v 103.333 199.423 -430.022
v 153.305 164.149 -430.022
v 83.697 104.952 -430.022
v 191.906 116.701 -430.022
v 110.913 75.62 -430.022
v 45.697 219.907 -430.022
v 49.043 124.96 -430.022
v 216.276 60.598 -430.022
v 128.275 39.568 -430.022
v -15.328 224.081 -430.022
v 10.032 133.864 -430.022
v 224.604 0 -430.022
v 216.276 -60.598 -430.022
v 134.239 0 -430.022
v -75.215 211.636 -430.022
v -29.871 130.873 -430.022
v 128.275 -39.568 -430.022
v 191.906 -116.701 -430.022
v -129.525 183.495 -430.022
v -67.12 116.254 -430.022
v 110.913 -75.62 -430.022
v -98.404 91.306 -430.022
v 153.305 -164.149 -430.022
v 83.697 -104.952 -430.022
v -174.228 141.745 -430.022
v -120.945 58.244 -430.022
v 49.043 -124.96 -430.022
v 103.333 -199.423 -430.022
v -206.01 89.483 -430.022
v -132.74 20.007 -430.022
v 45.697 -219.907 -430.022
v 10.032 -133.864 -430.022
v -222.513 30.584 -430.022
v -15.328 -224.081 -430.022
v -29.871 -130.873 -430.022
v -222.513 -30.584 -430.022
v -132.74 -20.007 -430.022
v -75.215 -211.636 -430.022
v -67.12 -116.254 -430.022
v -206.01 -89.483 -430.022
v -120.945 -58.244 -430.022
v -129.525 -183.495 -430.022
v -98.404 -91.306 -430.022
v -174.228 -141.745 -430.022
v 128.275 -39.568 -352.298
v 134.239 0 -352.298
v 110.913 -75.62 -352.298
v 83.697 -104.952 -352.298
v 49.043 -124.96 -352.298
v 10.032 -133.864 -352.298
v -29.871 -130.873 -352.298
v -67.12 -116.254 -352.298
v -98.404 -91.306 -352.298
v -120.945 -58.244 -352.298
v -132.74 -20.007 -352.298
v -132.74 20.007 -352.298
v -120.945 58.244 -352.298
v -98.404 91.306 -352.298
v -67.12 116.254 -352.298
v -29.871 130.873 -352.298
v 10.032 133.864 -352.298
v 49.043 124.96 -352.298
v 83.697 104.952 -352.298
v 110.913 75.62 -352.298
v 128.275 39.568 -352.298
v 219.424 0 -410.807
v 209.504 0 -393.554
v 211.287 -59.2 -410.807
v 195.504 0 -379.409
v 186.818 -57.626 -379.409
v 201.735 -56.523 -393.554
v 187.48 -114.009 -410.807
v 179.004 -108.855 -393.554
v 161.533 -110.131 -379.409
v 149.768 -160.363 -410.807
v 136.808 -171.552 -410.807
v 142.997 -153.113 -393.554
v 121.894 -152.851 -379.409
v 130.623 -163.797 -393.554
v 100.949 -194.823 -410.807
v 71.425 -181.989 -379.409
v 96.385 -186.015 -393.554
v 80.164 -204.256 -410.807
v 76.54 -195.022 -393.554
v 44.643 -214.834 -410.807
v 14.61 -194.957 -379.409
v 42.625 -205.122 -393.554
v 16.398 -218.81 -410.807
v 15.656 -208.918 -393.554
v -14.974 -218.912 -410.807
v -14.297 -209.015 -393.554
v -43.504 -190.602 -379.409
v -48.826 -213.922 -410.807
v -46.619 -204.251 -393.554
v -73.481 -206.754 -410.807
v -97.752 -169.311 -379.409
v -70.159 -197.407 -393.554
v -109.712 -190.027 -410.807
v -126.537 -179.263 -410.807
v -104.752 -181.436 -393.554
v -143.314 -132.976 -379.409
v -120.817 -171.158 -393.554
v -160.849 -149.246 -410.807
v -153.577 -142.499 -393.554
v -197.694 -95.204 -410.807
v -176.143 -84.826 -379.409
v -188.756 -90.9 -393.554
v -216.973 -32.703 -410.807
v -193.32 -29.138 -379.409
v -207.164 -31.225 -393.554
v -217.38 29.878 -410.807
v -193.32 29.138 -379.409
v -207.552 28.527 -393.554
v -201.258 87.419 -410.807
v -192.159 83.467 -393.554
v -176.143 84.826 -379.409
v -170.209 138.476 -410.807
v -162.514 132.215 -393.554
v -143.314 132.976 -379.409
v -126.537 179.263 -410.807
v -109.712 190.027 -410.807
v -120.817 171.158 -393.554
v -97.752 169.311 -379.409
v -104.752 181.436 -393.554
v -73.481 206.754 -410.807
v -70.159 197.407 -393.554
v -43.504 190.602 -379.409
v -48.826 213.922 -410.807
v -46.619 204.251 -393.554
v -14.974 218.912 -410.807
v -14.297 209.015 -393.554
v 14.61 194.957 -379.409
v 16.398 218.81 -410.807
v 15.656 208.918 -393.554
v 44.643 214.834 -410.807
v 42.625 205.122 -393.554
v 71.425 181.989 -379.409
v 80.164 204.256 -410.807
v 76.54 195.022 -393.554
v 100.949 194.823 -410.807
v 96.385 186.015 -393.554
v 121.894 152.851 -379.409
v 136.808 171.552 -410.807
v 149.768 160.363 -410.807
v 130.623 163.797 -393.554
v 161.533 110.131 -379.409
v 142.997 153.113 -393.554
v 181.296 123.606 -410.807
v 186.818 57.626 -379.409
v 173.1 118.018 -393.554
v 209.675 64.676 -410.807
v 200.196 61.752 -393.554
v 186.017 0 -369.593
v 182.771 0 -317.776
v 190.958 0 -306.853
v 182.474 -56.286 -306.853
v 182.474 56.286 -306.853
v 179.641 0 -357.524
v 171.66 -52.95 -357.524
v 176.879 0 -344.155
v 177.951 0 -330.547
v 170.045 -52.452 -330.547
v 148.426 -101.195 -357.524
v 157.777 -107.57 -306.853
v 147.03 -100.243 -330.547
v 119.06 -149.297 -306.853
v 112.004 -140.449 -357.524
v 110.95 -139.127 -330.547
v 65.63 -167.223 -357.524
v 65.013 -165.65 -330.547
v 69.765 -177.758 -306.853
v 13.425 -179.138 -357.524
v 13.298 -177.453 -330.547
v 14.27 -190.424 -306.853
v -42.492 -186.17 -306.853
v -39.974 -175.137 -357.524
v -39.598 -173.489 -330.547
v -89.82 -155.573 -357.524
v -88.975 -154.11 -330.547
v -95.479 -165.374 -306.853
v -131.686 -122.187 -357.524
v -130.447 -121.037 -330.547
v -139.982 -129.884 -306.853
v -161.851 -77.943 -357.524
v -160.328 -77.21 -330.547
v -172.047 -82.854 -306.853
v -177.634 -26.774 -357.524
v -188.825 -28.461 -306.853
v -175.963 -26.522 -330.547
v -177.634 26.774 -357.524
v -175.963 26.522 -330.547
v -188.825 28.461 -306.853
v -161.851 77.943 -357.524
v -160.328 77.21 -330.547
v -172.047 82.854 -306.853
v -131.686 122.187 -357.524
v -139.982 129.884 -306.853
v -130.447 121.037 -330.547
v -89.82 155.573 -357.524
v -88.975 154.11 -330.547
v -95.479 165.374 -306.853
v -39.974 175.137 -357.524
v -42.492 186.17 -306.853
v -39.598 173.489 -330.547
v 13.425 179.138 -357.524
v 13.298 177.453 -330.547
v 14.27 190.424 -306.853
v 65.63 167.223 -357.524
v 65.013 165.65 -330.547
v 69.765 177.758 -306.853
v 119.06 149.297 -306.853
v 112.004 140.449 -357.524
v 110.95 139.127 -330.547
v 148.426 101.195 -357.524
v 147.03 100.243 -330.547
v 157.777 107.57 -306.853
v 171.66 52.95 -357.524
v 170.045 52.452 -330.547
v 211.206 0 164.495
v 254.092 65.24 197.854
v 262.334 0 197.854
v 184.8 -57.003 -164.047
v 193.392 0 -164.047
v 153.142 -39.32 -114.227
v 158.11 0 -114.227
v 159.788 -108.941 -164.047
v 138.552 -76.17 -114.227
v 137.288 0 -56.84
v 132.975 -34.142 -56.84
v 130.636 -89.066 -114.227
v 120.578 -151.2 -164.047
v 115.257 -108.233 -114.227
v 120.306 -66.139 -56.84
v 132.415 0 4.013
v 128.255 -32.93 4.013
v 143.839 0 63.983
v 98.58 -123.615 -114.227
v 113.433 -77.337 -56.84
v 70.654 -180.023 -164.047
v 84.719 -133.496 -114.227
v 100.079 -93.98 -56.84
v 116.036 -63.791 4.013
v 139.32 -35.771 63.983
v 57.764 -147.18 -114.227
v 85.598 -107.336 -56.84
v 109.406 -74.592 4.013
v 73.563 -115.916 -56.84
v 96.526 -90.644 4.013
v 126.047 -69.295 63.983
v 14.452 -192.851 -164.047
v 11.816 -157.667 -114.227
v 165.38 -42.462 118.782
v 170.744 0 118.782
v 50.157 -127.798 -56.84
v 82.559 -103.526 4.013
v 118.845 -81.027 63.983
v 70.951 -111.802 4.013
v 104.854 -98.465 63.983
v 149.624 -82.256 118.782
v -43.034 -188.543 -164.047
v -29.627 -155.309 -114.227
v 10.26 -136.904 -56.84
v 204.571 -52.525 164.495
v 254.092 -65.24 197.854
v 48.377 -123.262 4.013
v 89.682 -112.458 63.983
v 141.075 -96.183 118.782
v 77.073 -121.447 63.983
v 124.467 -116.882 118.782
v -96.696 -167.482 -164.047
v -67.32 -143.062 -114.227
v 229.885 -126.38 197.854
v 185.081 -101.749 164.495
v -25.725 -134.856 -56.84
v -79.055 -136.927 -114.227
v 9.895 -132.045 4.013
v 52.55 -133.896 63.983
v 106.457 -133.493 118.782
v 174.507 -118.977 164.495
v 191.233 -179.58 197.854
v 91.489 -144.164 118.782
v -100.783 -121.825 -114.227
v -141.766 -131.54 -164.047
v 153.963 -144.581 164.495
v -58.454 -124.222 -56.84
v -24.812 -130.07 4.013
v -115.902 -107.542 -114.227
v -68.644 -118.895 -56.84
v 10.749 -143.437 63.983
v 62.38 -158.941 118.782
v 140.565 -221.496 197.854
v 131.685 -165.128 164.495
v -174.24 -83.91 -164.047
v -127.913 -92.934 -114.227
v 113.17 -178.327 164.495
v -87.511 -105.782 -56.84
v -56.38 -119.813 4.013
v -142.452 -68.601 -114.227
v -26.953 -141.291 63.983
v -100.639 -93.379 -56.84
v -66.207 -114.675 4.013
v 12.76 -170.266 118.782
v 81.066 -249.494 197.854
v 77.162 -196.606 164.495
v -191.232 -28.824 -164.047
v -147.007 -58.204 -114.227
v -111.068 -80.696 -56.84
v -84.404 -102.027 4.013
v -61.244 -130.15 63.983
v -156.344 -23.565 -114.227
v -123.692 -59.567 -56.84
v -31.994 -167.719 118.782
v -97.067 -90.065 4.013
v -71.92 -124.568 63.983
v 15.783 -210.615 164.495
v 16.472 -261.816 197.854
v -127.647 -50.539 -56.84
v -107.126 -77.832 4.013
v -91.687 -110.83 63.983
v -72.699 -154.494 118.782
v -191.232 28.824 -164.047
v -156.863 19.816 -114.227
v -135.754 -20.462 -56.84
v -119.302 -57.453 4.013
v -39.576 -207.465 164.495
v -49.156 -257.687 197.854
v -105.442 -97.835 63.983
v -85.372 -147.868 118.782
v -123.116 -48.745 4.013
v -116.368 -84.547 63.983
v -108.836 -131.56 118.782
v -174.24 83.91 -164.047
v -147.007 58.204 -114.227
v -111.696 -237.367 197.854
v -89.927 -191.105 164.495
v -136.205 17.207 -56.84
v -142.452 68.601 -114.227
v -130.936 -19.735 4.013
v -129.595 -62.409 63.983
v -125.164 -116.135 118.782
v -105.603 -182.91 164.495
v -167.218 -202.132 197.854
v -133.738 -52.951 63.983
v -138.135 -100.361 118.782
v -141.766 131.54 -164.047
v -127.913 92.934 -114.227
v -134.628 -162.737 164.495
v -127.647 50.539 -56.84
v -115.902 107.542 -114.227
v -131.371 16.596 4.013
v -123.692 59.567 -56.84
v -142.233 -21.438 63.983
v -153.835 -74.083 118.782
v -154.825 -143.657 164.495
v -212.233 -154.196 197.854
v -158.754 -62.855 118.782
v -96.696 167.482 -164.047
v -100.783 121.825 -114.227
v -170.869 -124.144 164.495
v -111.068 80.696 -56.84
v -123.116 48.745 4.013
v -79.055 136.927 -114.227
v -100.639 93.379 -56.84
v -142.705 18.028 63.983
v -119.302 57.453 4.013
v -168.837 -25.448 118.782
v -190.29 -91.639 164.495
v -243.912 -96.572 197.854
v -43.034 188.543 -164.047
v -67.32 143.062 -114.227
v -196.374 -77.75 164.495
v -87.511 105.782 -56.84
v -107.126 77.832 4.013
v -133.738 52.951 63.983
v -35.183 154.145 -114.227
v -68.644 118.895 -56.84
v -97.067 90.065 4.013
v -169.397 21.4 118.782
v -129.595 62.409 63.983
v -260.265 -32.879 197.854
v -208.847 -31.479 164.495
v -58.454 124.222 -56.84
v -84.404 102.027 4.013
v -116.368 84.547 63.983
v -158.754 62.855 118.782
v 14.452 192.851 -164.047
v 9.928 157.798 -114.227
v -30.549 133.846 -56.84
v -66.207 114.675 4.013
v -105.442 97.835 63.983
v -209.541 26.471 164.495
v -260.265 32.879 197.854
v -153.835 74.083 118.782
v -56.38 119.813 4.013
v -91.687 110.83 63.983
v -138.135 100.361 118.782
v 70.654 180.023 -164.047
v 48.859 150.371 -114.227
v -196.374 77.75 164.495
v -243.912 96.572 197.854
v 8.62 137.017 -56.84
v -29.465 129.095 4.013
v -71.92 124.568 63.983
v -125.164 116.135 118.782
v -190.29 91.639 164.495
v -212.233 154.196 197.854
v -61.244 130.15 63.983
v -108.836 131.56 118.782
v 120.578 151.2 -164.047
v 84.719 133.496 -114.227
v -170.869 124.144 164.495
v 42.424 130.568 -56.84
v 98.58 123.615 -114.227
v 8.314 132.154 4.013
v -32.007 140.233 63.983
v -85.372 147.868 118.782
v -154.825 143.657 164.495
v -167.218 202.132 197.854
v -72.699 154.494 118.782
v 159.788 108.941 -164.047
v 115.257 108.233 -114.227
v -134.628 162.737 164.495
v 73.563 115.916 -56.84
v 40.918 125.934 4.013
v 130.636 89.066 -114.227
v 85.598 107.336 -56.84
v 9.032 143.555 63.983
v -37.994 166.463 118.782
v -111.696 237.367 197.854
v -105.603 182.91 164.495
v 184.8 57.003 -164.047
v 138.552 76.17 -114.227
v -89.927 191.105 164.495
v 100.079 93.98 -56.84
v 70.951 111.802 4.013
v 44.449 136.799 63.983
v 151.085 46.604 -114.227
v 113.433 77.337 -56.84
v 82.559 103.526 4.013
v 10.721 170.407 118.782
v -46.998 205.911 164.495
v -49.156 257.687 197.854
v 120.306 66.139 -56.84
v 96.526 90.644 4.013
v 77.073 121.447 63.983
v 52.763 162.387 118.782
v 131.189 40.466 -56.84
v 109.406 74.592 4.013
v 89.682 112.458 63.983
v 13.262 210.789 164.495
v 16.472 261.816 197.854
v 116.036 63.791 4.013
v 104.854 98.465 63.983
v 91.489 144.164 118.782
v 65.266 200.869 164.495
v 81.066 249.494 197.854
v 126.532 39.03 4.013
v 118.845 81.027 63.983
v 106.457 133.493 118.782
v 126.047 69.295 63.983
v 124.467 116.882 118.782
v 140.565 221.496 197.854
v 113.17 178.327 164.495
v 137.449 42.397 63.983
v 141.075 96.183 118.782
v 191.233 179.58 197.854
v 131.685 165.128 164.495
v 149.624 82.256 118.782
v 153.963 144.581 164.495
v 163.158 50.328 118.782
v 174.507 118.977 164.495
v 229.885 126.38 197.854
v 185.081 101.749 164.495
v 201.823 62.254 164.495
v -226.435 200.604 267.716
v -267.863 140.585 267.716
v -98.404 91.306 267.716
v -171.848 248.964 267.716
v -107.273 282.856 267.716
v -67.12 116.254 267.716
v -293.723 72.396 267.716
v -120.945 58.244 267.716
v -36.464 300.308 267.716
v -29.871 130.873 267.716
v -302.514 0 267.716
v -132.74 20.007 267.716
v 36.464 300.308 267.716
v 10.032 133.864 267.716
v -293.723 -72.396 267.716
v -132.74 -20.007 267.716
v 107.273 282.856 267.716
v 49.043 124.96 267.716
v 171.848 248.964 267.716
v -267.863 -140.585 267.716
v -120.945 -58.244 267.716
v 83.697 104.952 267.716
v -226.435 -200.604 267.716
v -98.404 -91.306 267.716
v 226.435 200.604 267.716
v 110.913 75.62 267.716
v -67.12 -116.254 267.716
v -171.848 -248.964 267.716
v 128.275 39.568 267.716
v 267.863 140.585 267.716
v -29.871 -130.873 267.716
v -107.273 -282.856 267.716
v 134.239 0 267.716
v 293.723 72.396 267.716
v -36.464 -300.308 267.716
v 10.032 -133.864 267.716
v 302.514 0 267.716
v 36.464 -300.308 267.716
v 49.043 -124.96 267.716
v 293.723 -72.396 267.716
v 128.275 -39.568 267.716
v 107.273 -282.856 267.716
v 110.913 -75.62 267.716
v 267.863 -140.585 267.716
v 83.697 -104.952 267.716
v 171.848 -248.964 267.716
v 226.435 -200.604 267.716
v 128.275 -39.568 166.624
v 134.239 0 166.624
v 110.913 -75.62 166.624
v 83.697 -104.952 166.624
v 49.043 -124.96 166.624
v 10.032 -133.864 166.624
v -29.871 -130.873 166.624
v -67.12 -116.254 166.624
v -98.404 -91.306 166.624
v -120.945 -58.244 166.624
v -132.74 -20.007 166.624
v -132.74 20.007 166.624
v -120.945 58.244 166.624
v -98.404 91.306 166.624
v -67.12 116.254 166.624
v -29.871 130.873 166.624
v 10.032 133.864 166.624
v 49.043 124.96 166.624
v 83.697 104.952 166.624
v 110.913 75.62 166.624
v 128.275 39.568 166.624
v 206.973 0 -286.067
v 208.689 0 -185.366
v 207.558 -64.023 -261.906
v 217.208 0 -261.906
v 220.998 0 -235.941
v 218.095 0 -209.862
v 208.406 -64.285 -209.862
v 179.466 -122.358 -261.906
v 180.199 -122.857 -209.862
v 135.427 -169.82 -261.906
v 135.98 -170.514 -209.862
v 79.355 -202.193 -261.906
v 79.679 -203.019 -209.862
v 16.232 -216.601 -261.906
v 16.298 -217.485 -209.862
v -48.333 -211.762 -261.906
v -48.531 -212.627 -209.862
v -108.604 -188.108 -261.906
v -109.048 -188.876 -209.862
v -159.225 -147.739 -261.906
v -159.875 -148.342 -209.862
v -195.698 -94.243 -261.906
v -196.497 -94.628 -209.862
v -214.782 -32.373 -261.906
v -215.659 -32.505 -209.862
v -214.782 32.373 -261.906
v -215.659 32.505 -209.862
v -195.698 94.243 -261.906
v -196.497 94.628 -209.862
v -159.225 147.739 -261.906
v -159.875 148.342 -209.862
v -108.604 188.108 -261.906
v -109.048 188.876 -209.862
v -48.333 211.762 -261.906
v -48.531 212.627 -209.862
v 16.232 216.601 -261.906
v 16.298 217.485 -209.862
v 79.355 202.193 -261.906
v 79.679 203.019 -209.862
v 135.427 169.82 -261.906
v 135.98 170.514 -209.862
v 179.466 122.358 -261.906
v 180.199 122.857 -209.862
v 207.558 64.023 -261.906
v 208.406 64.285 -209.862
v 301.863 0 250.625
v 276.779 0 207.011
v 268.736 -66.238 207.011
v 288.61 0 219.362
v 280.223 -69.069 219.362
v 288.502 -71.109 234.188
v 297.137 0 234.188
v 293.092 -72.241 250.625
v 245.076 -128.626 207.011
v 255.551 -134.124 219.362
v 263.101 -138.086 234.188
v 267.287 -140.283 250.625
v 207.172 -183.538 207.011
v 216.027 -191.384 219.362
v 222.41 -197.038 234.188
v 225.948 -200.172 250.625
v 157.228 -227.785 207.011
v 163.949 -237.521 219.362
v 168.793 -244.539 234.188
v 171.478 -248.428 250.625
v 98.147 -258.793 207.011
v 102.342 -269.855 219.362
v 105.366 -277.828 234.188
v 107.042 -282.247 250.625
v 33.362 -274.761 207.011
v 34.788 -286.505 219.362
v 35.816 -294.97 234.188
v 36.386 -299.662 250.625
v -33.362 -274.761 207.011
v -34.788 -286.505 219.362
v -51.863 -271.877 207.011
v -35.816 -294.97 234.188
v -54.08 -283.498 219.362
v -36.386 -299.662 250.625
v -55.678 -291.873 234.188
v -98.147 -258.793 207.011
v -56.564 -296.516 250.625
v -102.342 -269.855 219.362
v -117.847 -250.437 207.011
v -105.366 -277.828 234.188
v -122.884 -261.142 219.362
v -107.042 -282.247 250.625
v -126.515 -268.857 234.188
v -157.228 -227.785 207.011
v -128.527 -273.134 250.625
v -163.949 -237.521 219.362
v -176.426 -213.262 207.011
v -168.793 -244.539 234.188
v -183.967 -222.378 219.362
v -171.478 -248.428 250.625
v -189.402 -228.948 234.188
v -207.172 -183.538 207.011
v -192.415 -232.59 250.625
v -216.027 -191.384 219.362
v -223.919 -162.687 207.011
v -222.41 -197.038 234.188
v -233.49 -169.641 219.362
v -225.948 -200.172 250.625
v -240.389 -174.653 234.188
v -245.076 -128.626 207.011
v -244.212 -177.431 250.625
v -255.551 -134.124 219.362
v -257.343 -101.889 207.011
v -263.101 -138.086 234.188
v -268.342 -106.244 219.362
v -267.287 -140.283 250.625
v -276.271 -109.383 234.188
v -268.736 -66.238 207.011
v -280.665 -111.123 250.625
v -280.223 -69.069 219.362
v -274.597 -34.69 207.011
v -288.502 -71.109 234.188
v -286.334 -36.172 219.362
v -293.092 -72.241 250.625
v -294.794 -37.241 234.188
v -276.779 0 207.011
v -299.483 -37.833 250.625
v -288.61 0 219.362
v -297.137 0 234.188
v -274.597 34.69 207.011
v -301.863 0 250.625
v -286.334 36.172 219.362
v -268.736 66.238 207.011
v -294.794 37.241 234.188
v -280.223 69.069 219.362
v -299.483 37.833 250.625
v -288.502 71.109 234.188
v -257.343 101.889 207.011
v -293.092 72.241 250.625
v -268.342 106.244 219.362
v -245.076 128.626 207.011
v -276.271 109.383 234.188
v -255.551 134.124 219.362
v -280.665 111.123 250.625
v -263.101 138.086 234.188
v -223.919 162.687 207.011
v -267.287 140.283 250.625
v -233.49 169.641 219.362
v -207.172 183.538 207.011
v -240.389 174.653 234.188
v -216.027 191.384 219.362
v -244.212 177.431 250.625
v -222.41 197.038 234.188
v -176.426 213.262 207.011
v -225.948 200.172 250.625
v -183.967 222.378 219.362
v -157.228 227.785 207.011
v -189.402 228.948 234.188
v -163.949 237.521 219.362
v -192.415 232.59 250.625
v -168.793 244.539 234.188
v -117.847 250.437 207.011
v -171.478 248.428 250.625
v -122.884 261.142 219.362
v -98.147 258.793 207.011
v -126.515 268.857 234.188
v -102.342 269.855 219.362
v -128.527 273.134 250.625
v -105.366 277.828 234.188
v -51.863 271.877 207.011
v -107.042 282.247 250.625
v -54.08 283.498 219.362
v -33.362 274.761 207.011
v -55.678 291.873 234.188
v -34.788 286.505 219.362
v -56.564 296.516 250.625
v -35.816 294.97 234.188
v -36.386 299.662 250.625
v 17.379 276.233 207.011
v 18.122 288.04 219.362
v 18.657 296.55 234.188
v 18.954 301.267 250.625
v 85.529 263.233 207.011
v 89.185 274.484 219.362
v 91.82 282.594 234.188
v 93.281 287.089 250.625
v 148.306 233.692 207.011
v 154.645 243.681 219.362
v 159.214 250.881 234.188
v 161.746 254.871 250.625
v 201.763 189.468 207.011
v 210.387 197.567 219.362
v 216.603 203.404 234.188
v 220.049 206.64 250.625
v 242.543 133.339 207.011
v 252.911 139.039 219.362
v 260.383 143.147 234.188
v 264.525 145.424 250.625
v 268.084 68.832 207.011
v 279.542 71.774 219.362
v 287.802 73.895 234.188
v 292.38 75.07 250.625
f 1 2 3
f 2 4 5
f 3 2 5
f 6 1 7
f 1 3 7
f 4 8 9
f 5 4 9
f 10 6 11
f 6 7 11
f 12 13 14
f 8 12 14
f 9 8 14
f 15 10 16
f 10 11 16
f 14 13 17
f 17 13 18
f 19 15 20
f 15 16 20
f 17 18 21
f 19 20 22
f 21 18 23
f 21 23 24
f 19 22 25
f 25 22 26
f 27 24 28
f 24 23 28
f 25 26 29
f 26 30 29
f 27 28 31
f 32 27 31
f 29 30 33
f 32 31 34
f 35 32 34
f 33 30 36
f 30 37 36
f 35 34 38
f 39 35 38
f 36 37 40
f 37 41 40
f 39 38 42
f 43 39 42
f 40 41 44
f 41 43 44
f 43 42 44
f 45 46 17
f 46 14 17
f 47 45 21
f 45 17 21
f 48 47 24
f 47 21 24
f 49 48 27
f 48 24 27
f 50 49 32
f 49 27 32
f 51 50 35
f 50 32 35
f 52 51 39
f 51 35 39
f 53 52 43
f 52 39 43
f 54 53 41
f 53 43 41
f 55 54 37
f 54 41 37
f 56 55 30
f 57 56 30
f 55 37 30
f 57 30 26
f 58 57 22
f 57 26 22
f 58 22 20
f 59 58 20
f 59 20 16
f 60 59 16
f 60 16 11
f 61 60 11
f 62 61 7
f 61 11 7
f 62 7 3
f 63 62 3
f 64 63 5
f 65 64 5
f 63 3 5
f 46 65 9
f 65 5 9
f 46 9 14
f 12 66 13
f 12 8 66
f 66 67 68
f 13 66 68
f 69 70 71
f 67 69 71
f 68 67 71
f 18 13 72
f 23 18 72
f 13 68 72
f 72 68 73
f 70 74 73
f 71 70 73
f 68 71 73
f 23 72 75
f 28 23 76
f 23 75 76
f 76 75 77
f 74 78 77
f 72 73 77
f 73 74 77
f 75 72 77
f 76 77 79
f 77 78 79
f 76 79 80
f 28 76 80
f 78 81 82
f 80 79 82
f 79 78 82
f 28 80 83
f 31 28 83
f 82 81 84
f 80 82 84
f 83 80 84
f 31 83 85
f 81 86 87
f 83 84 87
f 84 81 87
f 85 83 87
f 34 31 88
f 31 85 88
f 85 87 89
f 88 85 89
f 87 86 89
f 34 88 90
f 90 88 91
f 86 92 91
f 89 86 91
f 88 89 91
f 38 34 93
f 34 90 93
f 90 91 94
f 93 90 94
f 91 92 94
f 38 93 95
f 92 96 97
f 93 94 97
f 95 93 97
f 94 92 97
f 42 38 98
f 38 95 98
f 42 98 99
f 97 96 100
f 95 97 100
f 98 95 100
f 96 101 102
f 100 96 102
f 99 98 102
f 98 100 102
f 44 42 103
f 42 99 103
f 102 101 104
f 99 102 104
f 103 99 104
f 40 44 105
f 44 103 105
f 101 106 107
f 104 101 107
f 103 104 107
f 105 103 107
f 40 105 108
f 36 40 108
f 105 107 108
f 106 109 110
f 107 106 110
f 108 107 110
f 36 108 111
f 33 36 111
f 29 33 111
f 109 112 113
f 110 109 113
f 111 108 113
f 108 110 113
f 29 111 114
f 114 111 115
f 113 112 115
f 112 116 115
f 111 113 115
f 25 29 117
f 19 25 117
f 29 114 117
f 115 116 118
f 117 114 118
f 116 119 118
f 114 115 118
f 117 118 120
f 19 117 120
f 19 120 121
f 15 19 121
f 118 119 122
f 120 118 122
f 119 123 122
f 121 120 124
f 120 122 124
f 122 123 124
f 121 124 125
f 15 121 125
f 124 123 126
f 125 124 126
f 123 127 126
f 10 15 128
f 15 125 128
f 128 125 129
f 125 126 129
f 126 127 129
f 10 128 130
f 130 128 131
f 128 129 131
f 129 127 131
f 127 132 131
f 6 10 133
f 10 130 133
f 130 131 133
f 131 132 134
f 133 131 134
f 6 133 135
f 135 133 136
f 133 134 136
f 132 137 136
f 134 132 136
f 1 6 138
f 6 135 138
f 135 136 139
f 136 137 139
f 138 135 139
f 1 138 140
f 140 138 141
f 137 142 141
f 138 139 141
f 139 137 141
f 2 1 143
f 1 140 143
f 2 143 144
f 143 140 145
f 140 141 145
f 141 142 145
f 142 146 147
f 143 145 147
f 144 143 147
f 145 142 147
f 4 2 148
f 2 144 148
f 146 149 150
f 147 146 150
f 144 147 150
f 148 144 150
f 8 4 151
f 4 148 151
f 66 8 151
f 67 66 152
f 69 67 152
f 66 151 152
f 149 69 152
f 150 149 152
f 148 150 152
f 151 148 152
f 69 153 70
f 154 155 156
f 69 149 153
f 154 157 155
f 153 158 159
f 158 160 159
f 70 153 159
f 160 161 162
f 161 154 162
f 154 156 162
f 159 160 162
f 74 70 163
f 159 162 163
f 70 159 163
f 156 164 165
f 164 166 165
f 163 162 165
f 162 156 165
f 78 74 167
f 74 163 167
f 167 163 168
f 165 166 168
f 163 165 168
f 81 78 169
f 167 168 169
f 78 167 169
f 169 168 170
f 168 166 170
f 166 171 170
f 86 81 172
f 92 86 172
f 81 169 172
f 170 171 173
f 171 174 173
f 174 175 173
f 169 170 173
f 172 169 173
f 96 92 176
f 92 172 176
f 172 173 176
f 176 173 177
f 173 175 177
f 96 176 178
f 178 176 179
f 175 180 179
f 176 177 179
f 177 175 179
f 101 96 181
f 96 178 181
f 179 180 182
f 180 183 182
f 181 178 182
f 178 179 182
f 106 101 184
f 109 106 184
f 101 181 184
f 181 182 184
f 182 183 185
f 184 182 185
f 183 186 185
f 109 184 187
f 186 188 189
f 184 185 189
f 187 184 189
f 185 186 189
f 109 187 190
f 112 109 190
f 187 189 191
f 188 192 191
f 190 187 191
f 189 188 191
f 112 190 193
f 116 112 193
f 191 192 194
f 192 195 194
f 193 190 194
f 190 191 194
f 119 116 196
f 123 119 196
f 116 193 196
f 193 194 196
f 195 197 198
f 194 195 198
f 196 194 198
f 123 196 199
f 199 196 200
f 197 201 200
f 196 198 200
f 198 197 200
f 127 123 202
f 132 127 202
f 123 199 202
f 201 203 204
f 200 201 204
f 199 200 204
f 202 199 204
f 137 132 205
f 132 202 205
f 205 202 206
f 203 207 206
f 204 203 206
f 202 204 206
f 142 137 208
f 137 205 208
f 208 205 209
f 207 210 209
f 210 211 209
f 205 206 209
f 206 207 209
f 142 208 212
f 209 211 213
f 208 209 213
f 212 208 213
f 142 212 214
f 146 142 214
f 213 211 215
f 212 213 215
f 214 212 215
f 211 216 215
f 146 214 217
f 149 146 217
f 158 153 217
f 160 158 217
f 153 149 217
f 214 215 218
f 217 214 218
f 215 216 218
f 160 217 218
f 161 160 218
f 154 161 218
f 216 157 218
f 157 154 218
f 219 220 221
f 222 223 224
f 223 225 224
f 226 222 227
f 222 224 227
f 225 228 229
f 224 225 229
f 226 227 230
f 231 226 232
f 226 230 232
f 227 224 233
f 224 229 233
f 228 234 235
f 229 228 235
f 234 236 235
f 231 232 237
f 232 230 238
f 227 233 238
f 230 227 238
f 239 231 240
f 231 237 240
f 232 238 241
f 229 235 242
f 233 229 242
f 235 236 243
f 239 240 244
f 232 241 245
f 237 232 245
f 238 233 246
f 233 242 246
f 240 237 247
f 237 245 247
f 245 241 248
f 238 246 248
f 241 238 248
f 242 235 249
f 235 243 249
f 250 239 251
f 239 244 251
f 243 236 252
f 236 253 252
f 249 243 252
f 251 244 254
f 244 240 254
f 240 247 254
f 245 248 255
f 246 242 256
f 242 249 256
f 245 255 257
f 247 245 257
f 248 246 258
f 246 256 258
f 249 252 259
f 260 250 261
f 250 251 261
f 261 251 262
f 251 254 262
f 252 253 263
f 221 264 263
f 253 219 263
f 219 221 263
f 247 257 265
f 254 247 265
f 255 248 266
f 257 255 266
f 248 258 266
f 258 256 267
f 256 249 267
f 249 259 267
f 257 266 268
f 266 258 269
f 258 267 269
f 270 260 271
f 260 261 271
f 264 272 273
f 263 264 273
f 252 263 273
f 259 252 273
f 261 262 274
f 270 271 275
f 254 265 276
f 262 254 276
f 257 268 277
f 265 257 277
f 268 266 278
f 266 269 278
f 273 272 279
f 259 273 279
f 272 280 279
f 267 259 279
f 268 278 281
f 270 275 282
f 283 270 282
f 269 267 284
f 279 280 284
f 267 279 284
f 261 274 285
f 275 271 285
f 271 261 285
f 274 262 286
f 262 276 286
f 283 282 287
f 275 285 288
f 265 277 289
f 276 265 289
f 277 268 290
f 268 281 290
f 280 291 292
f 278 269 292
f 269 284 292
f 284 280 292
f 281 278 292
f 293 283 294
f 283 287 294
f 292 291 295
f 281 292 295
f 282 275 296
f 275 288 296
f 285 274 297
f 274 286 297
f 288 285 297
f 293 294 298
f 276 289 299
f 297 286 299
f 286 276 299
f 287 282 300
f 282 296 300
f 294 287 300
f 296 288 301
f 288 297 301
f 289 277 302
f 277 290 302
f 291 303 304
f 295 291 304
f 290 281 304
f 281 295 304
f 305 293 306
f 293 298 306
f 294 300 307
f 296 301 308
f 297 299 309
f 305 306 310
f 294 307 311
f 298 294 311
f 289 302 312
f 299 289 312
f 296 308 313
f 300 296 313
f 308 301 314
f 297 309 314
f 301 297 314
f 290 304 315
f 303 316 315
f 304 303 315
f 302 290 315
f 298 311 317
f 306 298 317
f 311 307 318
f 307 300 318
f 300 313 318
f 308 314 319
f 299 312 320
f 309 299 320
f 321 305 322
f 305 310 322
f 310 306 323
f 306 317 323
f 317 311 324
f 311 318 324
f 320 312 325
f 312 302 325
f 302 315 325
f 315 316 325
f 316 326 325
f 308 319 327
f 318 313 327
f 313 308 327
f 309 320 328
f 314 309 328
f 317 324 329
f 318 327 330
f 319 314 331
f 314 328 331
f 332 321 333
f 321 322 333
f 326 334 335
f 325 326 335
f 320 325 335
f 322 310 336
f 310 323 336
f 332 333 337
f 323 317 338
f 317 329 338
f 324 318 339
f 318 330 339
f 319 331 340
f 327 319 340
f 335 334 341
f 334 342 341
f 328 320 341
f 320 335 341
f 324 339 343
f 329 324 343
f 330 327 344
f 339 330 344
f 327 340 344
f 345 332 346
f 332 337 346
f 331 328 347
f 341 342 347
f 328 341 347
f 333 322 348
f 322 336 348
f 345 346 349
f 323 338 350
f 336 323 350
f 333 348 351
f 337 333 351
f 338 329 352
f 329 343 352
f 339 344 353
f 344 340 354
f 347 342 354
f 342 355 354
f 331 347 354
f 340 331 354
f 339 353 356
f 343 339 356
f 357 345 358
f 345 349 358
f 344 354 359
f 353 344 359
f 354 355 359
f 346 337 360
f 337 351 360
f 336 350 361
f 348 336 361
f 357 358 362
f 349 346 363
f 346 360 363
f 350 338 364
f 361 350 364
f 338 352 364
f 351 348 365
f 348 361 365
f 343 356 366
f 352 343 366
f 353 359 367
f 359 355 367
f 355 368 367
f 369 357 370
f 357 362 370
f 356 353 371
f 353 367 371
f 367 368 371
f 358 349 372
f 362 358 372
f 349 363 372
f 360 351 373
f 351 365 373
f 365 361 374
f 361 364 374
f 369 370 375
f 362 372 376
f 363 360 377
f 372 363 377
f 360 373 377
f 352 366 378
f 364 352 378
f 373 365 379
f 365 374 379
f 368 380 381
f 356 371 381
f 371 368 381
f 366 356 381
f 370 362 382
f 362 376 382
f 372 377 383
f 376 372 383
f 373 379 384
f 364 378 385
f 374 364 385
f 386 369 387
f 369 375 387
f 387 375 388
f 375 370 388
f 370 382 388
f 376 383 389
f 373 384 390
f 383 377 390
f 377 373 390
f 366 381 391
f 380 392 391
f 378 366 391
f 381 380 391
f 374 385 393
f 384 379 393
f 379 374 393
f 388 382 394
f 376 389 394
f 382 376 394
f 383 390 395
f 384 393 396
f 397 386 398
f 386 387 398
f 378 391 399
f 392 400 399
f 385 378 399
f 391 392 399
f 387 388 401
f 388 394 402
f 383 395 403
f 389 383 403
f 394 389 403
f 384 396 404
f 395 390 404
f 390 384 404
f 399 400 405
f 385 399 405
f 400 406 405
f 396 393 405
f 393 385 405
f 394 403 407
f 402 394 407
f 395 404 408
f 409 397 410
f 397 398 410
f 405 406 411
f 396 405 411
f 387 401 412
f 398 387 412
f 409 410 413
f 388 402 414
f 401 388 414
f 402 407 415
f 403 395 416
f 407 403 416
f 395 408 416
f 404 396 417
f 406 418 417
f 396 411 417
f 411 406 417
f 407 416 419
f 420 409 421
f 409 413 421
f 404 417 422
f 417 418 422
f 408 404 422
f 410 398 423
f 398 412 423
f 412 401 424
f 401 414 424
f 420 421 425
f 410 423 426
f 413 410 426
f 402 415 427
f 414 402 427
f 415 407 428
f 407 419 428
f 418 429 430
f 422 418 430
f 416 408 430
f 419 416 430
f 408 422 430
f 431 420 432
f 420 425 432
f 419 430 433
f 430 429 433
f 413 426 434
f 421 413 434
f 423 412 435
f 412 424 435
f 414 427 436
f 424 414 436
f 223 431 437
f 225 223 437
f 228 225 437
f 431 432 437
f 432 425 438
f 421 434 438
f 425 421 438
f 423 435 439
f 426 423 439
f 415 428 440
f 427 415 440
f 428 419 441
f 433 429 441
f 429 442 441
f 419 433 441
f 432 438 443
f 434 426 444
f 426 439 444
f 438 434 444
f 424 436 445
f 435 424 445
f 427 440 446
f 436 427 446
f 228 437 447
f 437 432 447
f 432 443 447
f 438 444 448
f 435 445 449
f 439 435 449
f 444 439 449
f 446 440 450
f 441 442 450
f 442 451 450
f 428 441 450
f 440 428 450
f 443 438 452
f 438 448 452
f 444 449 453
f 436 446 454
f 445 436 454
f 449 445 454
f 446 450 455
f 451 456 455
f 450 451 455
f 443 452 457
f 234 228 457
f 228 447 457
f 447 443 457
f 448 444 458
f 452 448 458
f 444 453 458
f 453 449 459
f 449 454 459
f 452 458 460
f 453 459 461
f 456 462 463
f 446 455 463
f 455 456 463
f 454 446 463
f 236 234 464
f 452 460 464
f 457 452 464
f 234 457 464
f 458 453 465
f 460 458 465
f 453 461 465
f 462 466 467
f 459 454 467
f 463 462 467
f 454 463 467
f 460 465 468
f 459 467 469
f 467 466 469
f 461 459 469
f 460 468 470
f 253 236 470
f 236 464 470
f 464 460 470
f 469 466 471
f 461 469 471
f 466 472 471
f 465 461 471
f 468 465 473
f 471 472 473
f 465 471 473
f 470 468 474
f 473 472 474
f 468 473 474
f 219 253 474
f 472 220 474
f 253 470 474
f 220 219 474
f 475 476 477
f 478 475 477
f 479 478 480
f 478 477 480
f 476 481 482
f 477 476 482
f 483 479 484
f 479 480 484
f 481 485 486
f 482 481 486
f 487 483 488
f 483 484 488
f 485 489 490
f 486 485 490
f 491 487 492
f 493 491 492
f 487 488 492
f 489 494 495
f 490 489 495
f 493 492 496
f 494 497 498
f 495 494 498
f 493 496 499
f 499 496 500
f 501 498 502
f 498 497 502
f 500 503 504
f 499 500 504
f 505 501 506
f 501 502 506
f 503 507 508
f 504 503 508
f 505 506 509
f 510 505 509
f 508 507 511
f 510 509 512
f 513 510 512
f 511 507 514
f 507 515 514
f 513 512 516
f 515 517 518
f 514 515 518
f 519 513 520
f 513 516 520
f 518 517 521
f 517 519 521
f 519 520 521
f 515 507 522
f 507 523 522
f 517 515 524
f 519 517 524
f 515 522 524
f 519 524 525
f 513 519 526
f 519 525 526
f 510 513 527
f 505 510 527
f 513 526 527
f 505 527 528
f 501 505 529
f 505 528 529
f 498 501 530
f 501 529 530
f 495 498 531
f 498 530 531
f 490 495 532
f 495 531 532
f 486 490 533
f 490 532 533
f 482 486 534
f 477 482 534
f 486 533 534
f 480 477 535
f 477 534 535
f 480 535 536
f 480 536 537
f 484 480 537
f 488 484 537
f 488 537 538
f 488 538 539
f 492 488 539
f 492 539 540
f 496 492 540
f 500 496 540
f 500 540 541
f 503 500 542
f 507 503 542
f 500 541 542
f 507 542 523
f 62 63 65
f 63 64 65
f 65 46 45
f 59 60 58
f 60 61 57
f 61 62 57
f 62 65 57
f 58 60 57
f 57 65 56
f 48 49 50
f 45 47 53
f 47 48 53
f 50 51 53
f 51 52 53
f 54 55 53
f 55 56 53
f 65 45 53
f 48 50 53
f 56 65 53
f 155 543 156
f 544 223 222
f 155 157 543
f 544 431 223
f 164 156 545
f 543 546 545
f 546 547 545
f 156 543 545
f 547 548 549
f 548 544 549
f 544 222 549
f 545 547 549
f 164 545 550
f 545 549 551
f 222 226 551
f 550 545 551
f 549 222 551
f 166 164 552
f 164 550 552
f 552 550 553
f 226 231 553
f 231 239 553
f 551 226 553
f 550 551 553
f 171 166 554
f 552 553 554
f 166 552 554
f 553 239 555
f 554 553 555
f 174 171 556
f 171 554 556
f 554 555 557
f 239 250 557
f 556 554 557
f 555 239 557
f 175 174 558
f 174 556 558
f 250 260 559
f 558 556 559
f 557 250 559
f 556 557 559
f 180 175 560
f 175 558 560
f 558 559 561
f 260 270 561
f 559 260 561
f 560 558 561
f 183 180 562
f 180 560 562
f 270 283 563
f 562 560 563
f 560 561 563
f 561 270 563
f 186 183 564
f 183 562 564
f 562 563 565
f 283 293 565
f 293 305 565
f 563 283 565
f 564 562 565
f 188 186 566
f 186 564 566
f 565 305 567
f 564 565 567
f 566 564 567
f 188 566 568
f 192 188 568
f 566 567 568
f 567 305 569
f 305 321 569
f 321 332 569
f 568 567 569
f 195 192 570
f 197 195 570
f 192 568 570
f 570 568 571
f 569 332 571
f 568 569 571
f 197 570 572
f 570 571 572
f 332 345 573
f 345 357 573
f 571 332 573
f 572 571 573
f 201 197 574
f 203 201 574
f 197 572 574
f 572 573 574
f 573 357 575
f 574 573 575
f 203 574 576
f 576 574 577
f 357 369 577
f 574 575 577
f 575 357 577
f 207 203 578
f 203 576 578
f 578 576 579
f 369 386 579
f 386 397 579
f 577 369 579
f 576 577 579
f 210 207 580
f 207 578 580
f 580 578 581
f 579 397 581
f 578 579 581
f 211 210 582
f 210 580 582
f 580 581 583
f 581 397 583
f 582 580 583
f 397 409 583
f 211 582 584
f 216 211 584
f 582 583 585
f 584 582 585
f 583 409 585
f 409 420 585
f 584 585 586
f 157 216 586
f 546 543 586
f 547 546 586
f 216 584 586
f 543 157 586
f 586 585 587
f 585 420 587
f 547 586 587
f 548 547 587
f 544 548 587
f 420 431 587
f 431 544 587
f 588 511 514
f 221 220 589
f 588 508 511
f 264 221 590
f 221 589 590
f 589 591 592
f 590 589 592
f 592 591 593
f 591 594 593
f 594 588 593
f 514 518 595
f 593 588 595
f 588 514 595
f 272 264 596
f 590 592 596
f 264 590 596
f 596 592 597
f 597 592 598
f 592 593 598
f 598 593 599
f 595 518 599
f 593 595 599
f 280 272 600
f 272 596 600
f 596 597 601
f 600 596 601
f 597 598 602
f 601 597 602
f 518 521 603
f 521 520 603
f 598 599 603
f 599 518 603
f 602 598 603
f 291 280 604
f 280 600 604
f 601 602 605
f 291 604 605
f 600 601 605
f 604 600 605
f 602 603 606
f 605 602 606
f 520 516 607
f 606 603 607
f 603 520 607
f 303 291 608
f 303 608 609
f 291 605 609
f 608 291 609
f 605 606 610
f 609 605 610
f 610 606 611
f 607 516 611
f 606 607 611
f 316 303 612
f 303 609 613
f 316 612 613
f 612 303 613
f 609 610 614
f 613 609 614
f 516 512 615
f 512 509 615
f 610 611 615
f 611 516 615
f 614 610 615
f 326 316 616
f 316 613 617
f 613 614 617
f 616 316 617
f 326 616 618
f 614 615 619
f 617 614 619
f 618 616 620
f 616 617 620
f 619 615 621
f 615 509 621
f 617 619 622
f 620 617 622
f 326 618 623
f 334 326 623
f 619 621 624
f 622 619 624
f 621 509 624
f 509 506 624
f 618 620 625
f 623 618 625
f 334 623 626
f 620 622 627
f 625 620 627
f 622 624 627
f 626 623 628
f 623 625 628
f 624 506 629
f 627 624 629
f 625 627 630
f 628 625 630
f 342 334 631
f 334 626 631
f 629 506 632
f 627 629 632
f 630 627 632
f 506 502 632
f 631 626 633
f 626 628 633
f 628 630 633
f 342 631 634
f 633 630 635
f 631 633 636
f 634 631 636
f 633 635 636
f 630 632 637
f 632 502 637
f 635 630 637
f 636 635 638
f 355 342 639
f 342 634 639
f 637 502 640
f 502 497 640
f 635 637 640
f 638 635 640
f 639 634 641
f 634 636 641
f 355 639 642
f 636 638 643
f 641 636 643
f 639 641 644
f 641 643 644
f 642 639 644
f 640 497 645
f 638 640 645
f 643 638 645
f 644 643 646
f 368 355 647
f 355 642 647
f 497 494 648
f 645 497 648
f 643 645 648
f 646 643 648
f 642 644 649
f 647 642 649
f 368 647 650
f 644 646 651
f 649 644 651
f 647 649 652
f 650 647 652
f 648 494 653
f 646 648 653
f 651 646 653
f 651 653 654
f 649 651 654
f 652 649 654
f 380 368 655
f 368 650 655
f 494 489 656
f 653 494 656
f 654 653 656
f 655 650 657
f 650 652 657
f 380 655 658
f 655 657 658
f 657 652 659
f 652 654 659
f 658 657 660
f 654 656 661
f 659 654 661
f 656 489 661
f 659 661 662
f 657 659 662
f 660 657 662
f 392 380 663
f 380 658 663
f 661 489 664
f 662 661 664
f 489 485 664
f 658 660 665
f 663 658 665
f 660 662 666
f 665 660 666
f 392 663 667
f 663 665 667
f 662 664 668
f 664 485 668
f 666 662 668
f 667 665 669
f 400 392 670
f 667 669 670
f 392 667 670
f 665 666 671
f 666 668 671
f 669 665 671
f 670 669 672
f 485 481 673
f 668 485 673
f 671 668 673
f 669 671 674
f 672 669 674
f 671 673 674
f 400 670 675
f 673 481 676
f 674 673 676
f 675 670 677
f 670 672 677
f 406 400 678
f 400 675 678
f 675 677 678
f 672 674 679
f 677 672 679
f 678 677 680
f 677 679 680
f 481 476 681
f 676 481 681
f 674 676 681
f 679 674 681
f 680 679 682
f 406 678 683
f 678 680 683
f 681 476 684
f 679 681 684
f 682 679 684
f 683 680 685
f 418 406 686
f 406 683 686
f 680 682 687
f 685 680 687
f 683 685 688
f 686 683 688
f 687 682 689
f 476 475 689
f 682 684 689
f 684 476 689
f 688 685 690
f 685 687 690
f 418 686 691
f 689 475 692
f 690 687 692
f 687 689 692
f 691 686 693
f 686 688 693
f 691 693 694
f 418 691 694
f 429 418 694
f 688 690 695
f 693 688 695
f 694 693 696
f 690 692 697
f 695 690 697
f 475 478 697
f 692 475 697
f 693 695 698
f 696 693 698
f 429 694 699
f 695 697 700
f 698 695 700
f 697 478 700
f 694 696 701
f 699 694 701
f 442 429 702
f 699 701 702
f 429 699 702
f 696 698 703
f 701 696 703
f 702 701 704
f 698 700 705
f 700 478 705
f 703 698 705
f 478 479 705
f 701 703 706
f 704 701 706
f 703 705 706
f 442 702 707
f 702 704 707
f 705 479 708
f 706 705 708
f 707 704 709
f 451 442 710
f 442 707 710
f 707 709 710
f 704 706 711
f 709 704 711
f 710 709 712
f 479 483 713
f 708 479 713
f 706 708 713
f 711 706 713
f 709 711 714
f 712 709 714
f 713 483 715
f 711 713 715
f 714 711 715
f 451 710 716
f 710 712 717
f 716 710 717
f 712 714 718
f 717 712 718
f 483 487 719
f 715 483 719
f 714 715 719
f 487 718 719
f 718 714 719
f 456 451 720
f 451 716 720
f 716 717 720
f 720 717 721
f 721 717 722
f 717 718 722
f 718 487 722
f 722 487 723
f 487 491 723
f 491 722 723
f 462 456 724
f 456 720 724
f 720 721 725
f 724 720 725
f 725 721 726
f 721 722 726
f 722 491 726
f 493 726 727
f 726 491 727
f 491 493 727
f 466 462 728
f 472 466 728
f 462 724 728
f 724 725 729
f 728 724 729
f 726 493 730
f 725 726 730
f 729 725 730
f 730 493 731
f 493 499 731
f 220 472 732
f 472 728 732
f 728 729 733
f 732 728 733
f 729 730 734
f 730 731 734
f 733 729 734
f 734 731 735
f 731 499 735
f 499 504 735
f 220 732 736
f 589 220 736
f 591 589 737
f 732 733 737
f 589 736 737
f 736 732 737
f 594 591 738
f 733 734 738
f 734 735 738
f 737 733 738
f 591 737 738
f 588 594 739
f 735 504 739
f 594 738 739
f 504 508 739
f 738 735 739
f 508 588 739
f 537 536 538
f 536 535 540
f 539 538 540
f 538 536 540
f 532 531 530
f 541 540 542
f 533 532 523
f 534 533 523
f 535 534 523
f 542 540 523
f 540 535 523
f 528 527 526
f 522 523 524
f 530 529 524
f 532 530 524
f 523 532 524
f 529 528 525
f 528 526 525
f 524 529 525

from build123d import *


with BuildPart() as f1:
    # F0 (on Front) → F1 (revolve)
    with BuildSketch(Plane.XZ):
        with BuildLine():
            Line((0, 166.624), (0, 0))
            Line((0, 0), (0, -352.298))
            Line((0, -352.298), (134.239, -352.298))
            Line((134.239, -352.298), (134.239, -430.022))
            Line((134.239, -430.022), (224.604496, -430.022))
            ThreePointArc((224.604496, -430.022), (215.021889, -401.859149), (195.503543, -379.409055))
            ThreePointArc((195.503543, -379.409055), (176.878926, -344.15539), (190.957997, -306.852883))
            ThreePointArc((190.957997, -306.852883), (220.997872, -235.94093), (193.391806, -164.046534))
            ThreePointArc((193.391806, -164.046534), (136.113903, 34.381675), (262.333799, 197.853539))
            ThreePointArc((262.333799, 197.853539), (293.322046, 226.516887), (302.514, 267.716))
            Line((302.514, 267.716), (134.239, 267.716))
            Line((134.239, 267.716), (134.239, 166.624))
            Line((134.239, 166.624), (0, 166.624))
        make_face()
    revolve(axis=Axis((0, 0, -176.149), (0, 0, -1)))


solid = f1.part
